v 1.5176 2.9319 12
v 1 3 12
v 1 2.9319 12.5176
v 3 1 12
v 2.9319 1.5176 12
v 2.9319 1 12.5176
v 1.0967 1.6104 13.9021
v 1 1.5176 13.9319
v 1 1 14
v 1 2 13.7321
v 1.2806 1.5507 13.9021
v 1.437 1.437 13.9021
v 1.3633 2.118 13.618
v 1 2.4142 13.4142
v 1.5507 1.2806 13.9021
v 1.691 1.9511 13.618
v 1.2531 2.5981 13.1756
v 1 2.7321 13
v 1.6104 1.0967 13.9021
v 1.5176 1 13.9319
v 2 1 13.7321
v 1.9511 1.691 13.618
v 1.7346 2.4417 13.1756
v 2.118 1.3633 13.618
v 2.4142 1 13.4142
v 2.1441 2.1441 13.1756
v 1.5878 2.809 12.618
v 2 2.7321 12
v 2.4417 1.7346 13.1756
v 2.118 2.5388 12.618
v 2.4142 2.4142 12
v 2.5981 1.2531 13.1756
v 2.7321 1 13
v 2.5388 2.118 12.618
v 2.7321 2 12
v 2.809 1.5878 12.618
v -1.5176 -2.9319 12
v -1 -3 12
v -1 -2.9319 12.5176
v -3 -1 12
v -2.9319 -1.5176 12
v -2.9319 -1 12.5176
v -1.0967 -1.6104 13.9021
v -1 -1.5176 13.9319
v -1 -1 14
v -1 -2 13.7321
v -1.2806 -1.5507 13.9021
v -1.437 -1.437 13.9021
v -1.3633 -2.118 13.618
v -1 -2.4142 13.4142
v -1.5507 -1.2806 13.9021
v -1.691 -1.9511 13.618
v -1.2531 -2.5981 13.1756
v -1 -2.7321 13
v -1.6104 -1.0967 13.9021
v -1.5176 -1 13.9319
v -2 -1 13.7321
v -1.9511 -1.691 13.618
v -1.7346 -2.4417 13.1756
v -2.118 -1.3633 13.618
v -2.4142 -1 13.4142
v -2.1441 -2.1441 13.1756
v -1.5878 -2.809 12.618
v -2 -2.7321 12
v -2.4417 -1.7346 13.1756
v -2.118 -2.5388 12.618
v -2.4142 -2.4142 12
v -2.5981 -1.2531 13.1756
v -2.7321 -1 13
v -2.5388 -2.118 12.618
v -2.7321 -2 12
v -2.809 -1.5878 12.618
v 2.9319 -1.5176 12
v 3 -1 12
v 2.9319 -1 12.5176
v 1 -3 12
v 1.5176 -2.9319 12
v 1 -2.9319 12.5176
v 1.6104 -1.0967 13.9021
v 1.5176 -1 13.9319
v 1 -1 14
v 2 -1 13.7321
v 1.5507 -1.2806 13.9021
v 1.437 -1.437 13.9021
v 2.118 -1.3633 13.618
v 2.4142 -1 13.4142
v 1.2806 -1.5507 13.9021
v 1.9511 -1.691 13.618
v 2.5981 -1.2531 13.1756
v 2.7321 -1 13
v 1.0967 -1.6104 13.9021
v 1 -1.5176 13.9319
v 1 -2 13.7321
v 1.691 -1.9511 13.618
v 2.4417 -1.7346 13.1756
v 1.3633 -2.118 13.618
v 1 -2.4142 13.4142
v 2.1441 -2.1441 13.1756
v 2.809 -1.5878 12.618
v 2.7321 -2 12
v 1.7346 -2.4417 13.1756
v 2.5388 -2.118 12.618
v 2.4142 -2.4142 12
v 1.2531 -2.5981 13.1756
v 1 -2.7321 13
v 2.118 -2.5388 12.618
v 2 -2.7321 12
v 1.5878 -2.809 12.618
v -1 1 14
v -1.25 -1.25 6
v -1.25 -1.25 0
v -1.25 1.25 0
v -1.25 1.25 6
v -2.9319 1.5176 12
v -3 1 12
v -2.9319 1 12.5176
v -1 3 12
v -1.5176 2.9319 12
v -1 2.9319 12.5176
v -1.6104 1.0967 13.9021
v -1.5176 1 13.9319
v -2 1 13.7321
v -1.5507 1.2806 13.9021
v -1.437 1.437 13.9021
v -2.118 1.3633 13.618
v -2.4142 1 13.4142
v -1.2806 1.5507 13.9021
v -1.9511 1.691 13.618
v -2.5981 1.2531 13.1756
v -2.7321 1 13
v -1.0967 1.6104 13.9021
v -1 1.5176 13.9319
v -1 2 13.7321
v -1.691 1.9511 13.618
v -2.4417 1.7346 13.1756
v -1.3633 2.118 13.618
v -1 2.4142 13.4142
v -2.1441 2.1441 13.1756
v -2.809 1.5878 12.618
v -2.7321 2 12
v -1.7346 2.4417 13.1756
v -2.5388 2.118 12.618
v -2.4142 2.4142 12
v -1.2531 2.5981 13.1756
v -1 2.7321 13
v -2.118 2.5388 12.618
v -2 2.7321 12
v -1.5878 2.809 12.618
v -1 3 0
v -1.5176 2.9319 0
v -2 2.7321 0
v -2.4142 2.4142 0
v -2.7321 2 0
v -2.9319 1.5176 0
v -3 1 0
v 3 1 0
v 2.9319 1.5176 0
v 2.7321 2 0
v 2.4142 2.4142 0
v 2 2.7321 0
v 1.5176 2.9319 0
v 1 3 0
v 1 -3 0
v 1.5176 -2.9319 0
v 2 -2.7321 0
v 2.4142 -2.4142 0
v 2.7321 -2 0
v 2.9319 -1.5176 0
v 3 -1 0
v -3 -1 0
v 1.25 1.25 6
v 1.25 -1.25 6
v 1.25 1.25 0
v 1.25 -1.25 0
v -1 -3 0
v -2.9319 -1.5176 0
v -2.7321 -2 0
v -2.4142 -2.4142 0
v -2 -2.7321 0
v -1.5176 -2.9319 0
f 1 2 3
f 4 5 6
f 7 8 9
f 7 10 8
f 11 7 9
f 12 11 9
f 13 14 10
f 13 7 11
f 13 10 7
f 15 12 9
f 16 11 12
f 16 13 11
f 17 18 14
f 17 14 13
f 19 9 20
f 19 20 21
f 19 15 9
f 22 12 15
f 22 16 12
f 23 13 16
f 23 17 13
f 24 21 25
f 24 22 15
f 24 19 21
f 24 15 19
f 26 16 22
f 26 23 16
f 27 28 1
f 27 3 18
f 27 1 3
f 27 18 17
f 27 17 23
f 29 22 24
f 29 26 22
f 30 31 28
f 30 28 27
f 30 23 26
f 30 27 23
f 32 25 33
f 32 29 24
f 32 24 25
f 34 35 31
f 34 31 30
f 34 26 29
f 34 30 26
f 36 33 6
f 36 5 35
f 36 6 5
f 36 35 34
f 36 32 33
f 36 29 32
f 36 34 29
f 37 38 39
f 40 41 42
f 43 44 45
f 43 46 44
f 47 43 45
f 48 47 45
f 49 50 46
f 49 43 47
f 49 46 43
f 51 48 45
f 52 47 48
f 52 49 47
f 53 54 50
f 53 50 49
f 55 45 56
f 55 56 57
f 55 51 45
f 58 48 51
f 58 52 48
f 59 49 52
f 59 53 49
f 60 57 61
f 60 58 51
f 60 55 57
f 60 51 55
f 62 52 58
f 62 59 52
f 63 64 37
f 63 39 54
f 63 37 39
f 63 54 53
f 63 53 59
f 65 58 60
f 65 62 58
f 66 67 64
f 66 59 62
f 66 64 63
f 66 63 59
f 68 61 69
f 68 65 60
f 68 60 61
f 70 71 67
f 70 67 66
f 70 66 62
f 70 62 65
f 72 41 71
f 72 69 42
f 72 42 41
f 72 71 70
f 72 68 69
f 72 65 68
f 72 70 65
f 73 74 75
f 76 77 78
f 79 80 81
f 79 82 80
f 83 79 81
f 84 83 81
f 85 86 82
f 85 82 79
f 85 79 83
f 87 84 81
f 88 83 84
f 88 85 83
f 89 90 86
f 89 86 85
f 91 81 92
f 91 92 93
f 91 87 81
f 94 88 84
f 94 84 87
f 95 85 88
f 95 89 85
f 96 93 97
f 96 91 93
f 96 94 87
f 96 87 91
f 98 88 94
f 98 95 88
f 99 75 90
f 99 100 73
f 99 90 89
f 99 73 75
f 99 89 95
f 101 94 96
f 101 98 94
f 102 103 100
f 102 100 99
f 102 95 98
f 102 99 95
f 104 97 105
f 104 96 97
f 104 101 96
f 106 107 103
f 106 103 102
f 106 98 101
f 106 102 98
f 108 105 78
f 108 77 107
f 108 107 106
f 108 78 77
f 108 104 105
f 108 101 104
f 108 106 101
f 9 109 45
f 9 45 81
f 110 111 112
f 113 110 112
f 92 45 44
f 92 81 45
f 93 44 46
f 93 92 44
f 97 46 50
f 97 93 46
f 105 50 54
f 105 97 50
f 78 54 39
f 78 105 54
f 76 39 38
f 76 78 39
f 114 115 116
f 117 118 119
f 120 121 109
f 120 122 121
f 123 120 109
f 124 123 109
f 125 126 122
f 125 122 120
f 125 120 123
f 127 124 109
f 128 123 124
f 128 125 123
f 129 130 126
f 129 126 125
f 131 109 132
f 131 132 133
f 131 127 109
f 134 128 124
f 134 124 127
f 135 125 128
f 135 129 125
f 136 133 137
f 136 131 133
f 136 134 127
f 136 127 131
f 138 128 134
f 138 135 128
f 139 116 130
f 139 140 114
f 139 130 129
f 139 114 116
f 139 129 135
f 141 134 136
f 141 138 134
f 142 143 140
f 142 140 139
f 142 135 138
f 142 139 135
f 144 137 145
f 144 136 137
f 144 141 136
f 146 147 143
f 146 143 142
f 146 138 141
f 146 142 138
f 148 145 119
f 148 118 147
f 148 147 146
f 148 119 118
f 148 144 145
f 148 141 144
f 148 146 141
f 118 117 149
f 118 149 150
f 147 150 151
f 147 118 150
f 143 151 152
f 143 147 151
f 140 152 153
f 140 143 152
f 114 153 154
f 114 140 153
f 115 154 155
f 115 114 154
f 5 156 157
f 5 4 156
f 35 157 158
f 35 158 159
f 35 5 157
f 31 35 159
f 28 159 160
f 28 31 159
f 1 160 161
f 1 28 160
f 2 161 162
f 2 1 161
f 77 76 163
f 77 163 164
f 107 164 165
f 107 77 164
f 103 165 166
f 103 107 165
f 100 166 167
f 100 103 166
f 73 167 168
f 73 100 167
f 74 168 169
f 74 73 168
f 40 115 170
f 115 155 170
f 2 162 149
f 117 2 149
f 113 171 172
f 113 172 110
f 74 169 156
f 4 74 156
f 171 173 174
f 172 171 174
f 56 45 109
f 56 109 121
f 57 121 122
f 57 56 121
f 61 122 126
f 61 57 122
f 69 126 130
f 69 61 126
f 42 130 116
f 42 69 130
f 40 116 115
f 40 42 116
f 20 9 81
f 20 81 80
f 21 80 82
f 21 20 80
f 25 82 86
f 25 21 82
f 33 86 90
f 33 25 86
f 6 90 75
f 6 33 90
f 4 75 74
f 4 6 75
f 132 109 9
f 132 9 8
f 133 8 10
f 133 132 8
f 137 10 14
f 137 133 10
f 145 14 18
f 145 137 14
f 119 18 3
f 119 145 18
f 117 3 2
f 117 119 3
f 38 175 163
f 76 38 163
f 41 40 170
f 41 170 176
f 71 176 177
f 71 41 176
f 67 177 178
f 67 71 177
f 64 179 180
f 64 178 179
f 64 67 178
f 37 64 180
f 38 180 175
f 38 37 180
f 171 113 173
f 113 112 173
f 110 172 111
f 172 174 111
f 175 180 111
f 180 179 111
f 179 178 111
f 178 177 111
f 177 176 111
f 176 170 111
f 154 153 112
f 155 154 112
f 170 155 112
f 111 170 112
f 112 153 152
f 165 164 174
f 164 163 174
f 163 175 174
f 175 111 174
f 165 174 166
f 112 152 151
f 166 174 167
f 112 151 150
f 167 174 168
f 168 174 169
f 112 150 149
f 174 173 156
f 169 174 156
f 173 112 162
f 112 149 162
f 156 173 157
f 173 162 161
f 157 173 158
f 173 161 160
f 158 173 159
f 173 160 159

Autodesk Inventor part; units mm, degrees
ref_plane "YZ Plane" through (0, 0, 0) normal (1, 0, 0) x (0, 1, 0)
ref_plane "XZ Plane" through (0, 0, 0) normal (0, 1, 0) x (-1, 0, 0)
ref_plane "XY Plane" through (0, 0, 0) normal (0, 0, 1) x (1, 0, 0)
sketch "Sketch1" plane through (0, 0, 0) normal (0, 0, 1) x (1, 0, 0)
  line L0 (-1, 1) -> (1, 1)
  line L1 (1, 1) -> (1, -1)
  line L2 (1, -1) -> (-1, -1)
  line L3 (-1, -1) -> (-1, 1)
  line L4 (-1, 1) -> (1, -1) construction
  line L5 (1, 1) -> (-1, -1) construction
  line L6 (3, 3) -> (-3, 3)
  line L7 (-3, 3) -> (-3, -3)
  line L8 (-3, -3) -> (3, -3)
  line L9 (3, -3) -> (3, 3)
  point P0 (0, 0)
  dimension "d0" = 2
  dimension "d1" = 2
  dimension "d2" = 2
extrude "Extrusion1" add sketch "Sketch1" along normal blind 14
sketch "Sketch2" plane through (0, 0, 14) normal (0, 0, 1) x (1, 0, 0)
  line L0 (-3, -3) -> (3, -3) projected
  line L1 (3, -3) -> (3, 3) projected
  line L2 (3, 3) -> (-3, 3) projected
  line L3 (-3, 3) -> (-3, -3) projected
  line L4 (1, -1) -> (-1, -1) projected
  line L5 (-1, -1) -> (-1, 1) projected
  line L6 (-1, 1) -> (1, 1) projected
  line L7 (1, 1) -> (1, -1) projected
  point P0 (0, 0)
extrude "Extrusion2" add sketch "Sketch2" against normal blind 8 contours L4 L5 L6 L7
fillet "Fillet1" radius 2 8 edges at (3, 3, 7) (-3, 3, 7) (-3, -3, 7) (3, -3, 7) (3, 0, 14) (0, -3, 14) (-3, 0, 14) (0, 3, 14)
sketch "Sketch3" plane through (0, 0, 0) normal (0, 0, -1) x (-1, 0, 0)
  arc A0 (1, -3) -> (3, -1) centre (1, -1) ccw projected
  line L0 (3, 1) -> (3, -1) projected
  arc A1 (3, 1) -> (1, 3) centre (1, 1) ccw projected
  line L1 (-1, 3) -> (1, 3) projected
  arc A2 (-1, 3) -> (-3, 1) centre (-1, 1) ccw projected
  line L2 (-3, -1) -> (-3, 1) projected
  arc A3 (-3, -1) -> (-1, -3) centre (-1, -1) ccw projected
  line L3 (1, -3) -> (-1, -3) projected
  line L4 (-1, -1) -> (1, -1) projected
  line L5 (-1, 1) -> (-1, -1) projected
  line L6 (1, 1) -> (-1, 1) projected
  line L7 (1, -1) -> (1, 1) projected
  line L8 (-1.25, -1.25) -> (1.25, -1.25)
  line L9 (1.25, -1.25) -> (1.25, 1.25)
  line L10 (1.25, 1.25) -> (-1.25, 1.25)
  line L11 (-1.25, 1.25) -> (-1.25, -1.25)
  point P0 (0, 0)
  dimension "d8" = 0.25
extrude "Extrusion3" cut sketch "Sketch3" against normal blind 6 contours L5 L6 L7 L4 | L11 L10 L9 L8
properties part number "switch cover"
